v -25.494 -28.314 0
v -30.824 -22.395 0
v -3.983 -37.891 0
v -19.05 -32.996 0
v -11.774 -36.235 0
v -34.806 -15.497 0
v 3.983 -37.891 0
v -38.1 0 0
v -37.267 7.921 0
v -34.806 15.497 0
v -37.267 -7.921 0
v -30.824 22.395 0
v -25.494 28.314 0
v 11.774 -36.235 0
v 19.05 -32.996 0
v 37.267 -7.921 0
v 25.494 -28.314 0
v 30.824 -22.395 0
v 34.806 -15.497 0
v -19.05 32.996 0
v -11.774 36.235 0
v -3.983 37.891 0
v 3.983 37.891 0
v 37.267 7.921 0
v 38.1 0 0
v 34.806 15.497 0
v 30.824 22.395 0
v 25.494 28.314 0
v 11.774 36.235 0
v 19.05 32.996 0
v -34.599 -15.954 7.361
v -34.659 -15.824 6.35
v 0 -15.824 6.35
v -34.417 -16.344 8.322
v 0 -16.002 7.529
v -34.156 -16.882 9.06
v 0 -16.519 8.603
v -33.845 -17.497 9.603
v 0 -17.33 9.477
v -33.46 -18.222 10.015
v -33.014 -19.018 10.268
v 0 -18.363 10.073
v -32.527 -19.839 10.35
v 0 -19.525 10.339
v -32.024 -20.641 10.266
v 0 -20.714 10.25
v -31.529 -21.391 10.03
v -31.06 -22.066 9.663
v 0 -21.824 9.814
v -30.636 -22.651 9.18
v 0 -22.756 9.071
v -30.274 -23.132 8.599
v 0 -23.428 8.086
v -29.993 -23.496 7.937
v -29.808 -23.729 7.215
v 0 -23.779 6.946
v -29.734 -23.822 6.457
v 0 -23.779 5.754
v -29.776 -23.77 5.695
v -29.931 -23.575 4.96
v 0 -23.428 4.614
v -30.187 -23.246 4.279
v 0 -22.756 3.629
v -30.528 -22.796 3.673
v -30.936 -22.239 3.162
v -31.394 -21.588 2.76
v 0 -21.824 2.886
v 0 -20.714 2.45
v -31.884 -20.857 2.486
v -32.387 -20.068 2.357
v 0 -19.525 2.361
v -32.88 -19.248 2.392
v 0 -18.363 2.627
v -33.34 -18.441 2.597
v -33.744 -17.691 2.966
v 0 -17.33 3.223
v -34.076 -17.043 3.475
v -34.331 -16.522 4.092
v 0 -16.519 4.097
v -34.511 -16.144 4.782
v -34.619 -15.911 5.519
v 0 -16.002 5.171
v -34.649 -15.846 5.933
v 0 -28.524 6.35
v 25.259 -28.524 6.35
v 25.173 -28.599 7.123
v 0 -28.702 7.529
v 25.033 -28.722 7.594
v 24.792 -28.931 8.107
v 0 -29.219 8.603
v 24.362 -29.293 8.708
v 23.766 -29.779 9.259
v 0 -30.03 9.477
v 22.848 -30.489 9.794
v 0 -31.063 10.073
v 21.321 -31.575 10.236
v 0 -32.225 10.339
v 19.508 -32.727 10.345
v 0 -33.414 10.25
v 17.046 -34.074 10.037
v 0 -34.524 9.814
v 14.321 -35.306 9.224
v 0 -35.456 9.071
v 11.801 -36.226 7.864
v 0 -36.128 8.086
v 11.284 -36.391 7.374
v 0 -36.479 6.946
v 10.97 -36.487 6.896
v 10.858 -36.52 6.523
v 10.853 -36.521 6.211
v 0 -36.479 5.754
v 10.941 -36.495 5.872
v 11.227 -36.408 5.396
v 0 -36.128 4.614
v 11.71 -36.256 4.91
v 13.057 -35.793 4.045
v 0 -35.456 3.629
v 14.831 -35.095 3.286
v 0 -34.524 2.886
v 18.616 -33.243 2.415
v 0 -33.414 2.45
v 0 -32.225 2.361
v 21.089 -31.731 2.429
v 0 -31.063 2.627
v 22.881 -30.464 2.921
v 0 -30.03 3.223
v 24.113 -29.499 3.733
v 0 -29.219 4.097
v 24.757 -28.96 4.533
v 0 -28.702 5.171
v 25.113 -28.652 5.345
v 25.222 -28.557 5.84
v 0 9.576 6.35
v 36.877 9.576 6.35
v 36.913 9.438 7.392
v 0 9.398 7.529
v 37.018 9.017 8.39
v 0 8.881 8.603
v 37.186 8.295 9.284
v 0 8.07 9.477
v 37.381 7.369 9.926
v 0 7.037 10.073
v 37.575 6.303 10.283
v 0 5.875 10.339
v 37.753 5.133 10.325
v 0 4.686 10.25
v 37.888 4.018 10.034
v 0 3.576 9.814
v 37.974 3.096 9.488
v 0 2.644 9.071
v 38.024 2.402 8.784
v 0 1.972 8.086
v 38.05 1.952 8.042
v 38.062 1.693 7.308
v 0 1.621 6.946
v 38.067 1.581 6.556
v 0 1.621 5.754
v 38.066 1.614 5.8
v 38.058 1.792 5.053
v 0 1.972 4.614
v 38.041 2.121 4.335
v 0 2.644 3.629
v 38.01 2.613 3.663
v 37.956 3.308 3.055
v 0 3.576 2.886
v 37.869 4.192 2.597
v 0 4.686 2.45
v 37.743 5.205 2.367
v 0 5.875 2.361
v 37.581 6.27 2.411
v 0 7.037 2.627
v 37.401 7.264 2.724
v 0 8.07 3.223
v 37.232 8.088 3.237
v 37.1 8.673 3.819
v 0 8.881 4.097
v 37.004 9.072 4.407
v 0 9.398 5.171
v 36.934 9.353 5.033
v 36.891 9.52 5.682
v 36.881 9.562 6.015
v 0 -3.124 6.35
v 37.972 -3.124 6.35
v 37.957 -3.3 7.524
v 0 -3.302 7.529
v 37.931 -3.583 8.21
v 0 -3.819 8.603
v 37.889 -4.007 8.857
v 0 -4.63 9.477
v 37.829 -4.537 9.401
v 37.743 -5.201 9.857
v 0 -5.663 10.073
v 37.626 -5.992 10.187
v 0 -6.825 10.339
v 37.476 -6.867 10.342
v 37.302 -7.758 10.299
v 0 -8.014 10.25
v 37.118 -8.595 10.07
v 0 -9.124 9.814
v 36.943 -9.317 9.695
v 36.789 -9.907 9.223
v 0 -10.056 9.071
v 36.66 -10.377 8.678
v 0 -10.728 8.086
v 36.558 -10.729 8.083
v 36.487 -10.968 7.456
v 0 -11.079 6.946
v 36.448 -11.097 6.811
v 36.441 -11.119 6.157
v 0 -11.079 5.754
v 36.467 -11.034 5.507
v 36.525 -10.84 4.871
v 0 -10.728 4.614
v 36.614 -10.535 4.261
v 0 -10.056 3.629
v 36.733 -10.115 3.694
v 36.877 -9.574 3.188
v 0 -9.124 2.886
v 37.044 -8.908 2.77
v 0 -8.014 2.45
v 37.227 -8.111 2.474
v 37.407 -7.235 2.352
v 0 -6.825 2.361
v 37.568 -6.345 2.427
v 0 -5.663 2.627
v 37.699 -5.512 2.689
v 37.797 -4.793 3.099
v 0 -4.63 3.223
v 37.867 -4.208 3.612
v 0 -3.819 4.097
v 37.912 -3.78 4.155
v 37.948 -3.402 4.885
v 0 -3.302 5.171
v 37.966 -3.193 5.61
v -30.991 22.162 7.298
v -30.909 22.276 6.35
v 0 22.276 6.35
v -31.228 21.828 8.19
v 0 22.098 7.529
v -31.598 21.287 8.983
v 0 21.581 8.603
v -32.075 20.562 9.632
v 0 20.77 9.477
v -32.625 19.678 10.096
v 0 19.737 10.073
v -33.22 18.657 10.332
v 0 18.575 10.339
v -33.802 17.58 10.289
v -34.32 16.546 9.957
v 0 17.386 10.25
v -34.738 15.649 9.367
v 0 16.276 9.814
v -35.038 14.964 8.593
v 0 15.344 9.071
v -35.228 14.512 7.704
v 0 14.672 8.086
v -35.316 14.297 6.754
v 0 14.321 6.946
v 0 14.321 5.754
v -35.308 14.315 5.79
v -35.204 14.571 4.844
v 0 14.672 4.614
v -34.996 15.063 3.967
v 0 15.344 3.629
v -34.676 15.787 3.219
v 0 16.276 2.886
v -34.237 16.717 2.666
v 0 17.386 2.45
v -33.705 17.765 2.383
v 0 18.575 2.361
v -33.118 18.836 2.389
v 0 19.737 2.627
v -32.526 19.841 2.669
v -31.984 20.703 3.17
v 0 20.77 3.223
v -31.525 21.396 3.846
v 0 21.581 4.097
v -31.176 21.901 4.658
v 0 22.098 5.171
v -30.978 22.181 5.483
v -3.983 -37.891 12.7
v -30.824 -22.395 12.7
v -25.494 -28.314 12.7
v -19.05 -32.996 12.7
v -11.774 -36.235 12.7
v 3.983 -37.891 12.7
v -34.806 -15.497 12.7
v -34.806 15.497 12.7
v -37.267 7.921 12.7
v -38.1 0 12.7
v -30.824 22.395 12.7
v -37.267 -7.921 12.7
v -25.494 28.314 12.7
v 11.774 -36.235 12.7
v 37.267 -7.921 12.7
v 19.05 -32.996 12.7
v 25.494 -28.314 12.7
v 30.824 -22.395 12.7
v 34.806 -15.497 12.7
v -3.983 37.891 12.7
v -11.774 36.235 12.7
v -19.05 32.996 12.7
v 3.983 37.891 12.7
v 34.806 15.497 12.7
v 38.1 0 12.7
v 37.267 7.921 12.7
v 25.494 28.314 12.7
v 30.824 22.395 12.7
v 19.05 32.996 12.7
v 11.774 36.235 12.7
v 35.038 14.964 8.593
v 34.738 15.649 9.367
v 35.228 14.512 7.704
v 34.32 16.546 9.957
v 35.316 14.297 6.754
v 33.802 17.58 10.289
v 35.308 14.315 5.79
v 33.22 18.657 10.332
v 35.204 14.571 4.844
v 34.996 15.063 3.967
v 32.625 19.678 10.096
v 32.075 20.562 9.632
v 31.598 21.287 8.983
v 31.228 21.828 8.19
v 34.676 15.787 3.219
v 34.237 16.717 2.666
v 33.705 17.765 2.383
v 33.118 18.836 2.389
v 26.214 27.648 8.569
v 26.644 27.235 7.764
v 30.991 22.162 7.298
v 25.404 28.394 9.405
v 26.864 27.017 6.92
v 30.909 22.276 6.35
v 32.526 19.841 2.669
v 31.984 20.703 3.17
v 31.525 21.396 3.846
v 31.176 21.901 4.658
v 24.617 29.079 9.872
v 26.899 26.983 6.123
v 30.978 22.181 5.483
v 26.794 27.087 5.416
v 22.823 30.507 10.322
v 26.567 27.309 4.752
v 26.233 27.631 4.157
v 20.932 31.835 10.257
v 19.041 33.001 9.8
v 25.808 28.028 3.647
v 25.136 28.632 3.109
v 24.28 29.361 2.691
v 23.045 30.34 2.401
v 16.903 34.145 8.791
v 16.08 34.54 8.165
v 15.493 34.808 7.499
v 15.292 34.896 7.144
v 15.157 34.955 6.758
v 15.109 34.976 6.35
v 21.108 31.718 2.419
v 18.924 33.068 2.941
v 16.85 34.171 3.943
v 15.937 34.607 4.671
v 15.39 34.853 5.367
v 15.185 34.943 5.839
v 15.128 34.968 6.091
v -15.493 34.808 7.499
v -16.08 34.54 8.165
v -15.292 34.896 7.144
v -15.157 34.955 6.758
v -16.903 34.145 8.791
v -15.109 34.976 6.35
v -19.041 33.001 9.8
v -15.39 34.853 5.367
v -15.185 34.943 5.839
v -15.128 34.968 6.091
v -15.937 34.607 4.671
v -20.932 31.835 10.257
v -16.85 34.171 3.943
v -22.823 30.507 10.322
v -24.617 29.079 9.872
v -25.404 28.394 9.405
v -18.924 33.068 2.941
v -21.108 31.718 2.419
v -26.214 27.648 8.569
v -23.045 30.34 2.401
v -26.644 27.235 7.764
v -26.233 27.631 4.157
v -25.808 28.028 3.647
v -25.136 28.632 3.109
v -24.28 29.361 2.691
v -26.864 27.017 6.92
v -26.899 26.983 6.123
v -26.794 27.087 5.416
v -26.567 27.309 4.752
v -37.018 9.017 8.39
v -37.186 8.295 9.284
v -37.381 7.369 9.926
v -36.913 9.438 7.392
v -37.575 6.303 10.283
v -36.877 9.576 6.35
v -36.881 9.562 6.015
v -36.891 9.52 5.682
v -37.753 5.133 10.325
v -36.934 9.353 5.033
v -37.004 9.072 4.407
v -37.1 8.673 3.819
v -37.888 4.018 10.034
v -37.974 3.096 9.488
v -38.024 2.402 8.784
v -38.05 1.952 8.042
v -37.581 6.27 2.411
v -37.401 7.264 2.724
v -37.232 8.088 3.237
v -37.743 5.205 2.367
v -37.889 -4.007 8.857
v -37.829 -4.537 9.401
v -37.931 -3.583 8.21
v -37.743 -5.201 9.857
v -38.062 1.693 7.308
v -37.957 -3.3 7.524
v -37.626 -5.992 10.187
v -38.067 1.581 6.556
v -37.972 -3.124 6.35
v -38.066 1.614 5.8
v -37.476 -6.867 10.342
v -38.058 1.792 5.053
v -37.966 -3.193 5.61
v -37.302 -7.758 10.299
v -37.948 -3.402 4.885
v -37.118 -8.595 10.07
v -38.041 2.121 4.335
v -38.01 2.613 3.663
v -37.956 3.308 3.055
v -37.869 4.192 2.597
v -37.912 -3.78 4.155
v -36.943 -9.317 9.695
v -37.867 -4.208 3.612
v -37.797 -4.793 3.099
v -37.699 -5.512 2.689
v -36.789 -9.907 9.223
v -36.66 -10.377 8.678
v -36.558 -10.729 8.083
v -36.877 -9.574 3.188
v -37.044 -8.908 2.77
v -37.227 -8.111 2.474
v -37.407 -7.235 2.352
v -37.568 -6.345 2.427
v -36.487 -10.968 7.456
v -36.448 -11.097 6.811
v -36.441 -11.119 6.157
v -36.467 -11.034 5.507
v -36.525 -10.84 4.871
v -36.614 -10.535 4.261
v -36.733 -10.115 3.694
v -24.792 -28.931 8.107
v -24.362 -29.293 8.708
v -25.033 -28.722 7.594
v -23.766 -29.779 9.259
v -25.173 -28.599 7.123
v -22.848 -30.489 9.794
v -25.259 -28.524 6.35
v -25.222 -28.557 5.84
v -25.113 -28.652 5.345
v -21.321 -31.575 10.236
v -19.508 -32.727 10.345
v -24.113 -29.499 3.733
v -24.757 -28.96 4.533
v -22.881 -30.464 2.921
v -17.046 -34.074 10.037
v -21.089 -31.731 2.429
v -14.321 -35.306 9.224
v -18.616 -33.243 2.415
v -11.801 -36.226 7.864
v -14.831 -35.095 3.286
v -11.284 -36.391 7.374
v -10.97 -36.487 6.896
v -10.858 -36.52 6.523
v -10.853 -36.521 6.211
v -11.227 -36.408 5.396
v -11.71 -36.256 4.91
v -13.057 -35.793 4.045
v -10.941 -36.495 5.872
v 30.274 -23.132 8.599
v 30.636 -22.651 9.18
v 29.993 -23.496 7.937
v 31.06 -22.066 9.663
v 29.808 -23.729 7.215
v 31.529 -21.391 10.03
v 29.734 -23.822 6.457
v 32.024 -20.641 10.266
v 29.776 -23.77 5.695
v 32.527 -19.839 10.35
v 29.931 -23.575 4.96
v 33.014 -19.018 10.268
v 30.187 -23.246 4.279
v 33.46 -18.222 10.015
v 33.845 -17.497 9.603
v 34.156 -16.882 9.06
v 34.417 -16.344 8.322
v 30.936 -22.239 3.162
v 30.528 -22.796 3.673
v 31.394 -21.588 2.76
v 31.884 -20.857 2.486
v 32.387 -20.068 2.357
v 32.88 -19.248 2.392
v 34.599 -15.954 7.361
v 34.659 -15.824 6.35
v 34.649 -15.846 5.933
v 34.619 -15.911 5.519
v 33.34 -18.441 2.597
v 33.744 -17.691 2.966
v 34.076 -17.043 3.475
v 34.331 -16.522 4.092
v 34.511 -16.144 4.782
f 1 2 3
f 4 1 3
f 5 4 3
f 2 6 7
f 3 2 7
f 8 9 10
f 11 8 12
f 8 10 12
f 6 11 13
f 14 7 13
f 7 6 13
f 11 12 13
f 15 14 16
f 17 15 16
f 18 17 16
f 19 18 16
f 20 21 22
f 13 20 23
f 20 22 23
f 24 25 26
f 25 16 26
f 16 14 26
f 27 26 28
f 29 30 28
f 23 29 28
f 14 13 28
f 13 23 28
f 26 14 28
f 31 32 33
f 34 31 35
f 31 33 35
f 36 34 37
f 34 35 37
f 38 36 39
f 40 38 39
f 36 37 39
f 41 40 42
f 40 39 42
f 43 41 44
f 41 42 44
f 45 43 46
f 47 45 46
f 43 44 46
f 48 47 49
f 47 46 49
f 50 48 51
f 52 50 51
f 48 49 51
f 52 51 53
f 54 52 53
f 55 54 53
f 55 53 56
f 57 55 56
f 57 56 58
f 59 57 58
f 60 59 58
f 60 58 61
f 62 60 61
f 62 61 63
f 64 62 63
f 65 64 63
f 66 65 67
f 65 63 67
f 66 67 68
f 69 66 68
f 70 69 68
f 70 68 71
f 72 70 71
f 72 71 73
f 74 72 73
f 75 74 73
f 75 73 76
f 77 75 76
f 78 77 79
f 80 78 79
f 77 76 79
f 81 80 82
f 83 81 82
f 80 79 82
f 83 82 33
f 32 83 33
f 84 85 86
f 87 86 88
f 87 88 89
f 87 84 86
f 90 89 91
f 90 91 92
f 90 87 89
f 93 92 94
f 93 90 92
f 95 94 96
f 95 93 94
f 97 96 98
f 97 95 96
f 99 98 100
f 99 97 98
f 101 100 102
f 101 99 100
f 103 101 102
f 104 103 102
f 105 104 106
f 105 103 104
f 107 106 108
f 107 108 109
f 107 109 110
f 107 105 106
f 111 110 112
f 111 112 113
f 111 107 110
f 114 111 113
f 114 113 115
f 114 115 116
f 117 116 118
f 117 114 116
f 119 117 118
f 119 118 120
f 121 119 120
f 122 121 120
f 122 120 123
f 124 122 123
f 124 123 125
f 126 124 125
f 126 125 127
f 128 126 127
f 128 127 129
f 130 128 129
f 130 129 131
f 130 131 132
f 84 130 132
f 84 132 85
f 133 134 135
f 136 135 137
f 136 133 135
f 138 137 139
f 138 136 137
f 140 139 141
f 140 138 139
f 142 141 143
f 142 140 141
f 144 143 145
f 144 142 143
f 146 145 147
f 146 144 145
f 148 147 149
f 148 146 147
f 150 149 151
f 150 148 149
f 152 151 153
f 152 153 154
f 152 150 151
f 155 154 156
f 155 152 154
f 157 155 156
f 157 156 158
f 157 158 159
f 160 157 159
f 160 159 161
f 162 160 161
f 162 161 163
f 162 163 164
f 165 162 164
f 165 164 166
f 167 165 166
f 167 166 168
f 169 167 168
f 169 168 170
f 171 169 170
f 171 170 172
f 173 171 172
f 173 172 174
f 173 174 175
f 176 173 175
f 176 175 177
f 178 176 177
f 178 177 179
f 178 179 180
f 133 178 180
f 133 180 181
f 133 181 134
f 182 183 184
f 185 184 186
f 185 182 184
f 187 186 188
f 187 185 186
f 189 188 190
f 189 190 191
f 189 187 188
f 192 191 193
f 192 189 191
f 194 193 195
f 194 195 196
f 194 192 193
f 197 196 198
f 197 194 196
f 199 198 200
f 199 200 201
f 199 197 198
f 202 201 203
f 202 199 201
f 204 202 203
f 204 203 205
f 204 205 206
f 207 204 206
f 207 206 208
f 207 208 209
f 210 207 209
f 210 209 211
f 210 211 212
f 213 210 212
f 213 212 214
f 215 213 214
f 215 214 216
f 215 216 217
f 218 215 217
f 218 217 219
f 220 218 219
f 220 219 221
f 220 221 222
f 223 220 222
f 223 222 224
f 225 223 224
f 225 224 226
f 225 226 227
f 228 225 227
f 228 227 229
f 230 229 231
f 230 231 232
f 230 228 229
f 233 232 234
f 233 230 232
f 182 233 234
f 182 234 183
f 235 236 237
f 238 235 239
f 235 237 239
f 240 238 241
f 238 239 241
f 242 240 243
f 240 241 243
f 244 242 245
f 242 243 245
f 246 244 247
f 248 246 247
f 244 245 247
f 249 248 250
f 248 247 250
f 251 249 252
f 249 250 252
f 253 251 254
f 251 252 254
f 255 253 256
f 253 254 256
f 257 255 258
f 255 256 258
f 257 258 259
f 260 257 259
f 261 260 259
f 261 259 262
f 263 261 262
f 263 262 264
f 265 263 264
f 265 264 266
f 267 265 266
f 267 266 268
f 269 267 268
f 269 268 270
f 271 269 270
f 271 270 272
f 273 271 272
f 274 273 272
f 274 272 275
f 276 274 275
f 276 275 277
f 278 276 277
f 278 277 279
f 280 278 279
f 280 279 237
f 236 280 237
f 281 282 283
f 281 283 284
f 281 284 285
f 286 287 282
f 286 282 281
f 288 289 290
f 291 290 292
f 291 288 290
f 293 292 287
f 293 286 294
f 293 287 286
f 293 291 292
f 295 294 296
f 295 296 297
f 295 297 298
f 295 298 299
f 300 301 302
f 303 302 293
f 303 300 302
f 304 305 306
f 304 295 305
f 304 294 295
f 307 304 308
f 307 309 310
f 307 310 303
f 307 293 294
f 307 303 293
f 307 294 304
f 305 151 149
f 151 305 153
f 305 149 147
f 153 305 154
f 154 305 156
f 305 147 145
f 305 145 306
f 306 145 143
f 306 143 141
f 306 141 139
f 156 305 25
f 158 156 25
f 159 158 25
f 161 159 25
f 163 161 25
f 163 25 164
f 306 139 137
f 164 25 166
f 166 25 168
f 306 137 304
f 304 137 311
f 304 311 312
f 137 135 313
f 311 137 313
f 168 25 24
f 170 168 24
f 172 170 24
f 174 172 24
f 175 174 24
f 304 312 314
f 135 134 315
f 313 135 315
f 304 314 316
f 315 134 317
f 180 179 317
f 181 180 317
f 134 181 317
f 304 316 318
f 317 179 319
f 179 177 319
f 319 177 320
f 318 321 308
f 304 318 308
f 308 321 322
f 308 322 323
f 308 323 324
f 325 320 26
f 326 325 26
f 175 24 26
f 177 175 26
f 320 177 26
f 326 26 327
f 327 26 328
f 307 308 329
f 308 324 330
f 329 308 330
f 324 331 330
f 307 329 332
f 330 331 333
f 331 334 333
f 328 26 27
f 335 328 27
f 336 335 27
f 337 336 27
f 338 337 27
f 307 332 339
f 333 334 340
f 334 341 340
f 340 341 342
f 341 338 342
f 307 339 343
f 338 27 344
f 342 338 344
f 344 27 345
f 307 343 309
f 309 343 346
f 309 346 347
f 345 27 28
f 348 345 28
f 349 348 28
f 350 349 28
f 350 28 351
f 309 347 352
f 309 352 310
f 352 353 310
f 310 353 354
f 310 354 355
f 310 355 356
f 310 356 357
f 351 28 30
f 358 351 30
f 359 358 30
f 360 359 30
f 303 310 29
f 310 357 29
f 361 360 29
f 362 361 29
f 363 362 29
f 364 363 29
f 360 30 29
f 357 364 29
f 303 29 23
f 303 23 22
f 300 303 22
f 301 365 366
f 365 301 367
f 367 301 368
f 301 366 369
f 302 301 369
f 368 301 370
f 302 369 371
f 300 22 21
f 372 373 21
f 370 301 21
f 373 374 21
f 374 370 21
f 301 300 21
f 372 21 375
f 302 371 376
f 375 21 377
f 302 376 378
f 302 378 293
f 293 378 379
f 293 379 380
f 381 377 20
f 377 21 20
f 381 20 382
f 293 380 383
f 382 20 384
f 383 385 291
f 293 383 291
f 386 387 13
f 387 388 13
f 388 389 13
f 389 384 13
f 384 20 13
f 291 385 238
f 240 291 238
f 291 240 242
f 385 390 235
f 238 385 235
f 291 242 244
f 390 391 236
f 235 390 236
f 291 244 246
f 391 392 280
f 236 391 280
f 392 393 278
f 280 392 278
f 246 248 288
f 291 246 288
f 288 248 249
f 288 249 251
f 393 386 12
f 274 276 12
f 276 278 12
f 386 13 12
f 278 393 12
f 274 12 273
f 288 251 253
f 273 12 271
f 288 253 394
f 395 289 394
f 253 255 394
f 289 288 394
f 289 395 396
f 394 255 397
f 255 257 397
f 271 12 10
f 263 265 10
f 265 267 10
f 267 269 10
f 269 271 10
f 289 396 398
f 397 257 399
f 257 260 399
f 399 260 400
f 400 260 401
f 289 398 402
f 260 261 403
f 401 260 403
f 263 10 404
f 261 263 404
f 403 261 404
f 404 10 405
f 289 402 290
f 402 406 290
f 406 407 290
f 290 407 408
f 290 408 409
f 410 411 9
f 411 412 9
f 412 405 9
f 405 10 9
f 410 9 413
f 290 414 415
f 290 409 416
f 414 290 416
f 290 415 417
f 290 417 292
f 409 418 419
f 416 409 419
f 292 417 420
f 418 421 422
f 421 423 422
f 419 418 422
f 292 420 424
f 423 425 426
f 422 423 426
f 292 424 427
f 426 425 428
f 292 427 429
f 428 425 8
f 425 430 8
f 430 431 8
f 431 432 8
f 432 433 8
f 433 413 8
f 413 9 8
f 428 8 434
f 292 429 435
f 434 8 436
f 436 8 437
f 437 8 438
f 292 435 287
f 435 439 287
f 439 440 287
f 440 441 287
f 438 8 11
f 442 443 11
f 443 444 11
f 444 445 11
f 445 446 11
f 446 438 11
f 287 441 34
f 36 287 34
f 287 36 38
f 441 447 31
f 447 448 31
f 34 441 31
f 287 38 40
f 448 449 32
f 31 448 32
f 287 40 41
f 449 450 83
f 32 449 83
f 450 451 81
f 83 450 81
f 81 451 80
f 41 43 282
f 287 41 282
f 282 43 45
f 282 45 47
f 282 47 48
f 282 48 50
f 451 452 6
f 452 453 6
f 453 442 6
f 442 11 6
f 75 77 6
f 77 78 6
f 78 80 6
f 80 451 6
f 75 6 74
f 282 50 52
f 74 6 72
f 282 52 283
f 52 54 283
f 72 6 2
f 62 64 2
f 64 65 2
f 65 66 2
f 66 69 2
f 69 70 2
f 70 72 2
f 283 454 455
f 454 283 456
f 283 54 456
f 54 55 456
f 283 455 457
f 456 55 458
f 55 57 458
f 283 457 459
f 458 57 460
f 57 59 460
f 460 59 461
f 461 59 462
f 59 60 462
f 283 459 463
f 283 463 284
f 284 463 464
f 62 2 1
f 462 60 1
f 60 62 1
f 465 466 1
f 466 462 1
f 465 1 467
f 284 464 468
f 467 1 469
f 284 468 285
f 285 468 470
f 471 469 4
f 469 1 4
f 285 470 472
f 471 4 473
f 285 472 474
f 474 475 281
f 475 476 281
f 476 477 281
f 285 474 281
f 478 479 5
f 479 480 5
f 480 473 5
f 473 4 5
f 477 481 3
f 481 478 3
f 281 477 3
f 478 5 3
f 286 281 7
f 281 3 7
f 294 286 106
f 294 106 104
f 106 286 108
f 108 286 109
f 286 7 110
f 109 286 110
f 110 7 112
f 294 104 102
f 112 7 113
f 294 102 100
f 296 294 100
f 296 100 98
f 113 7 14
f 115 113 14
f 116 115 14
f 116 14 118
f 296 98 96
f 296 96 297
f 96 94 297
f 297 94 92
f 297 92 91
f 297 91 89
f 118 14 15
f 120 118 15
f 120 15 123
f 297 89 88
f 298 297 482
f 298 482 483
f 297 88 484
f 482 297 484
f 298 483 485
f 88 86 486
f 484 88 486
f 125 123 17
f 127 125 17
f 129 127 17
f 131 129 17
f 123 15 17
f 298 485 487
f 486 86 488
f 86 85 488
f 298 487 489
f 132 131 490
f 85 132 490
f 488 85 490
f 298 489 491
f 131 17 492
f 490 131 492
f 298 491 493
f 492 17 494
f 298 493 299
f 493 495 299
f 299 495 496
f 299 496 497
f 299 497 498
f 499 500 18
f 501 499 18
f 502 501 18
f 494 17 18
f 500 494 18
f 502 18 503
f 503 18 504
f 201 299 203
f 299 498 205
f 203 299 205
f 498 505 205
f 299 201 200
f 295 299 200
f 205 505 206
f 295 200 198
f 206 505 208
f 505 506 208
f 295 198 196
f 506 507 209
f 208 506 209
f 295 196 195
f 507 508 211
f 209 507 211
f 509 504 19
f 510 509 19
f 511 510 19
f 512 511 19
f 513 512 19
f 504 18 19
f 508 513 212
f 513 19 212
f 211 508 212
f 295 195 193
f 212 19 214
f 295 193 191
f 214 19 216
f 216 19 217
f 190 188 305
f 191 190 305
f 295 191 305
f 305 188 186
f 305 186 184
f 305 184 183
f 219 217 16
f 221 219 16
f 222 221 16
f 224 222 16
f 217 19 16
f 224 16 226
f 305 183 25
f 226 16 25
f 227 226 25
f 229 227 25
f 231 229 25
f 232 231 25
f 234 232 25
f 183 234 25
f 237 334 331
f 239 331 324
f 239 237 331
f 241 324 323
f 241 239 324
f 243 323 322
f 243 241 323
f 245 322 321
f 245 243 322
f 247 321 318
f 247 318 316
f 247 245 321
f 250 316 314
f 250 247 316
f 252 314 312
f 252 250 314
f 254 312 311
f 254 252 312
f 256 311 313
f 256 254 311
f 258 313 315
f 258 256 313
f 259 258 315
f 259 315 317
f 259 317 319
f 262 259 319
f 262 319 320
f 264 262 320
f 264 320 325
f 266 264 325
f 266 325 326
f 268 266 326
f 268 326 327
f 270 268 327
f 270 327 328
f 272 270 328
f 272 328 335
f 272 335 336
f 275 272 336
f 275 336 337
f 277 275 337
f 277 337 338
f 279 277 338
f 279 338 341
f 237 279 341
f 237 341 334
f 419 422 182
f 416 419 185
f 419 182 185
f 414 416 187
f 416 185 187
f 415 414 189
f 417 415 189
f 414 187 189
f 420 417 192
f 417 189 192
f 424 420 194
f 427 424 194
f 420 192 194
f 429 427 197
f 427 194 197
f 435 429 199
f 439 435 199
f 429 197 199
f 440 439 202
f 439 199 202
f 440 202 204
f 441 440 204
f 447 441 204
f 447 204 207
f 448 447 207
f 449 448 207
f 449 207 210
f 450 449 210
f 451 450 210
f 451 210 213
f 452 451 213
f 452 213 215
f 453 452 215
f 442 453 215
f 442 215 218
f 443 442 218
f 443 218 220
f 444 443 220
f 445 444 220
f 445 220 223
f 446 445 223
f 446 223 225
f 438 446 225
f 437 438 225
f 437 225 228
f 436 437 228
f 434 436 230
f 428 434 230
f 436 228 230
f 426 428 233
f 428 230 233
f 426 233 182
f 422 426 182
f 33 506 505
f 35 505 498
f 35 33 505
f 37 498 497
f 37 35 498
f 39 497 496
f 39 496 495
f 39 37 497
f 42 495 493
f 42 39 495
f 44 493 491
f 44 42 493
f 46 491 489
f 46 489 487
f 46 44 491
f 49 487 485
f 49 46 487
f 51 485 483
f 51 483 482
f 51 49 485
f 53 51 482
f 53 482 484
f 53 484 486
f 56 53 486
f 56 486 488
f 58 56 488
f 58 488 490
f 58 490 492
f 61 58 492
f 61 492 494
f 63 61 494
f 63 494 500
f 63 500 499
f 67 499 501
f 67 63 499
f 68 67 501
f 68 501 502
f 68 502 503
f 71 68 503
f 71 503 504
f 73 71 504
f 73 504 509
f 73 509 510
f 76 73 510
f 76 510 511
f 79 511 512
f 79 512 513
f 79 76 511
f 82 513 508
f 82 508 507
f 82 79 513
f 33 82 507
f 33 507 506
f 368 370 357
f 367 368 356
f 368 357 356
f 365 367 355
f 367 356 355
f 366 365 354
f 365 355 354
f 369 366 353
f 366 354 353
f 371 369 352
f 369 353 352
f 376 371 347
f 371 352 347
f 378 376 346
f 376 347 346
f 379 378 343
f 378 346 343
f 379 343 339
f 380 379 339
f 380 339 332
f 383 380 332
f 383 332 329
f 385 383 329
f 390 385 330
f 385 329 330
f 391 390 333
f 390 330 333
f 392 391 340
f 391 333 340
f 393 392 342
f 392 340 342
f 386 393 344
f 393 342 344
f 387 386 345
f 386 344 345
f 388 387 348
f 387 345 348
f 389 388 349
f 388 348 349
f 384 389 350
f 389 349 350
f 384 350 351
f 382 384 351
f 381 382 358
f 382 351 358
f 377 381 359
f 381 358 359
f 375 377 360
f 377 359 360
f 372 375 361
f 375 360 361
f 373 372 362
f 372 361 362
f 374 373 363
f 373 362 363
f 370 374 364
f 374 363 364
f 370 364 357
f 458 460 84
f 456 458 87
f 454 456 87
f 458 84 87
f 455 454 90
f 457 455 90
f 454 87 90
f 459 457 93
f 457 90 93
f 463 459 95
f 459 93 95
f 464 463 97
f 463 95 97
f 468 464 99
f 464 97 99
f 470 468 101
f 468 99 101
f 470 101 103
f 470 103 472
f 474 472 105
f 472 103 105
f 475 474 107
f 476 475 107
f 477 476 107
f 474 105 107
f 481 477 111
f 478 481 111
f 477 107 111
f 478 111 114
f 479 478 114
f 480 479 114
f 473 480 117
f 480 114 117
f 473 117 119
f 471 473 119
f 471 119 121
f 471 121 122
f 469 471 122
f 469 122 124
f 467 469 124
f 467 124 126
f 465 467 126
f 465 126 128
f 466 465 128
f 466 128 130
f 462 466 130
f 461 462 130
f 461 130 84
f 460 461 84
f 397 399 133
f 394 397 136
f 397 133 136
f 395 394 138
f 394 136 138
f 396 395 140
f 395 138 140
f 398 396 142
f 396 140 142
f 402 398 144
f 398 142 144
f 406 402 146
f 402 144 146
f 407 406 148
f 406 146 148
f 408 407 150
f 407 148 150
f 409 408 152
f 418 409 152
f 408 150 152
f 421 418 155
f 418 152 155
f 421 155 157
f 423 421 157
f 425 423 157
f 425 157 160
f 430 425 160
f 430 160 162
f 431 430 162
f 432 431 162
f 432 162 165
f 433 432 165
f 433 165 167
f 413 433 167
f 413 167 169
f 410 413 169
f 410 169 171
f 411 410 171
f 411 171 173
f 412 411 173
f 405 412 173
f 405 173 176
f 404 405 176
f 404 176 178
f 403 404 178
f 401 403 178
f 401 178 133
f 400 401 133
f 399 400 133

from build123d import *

# Parameters (mm, degrees)
F0_R     = 38.1
F1_DEPTH = 12.7
F2_R     = 4
F3_DEPTH = 50


with BuildPart() as f1:
    # F0 (on Top) → F1 (new body)
    with BuildSketch(Plane.XY):
        Circle(F0_R)
    extrude(amount=F1_DEPTH)

    # F2 (on Right) → F3 (cut, symmetric)
    with BuildSketch(Plane.YZ):
        with Locations((-32.5239, 6.35)):
            Circle(F2_R)
        with Locations((-19.8239, 6.35)):
            Circle(F2_R)
        with Locations((-7.1239, 6.35)):
            Circle(F2_R)
        with Locations((5.5761, 6.35)):
            Circle(F2_R)
        with Locations((18.2761, 6.35)):
            Circle(F2_R)
        with Locations((30.9761, 6.35)):
            Circle(F2_R)
    extrude(amount=F3_DEPTH, both=True, mode=Mode.SUBTRACT)


solid = f1.part
